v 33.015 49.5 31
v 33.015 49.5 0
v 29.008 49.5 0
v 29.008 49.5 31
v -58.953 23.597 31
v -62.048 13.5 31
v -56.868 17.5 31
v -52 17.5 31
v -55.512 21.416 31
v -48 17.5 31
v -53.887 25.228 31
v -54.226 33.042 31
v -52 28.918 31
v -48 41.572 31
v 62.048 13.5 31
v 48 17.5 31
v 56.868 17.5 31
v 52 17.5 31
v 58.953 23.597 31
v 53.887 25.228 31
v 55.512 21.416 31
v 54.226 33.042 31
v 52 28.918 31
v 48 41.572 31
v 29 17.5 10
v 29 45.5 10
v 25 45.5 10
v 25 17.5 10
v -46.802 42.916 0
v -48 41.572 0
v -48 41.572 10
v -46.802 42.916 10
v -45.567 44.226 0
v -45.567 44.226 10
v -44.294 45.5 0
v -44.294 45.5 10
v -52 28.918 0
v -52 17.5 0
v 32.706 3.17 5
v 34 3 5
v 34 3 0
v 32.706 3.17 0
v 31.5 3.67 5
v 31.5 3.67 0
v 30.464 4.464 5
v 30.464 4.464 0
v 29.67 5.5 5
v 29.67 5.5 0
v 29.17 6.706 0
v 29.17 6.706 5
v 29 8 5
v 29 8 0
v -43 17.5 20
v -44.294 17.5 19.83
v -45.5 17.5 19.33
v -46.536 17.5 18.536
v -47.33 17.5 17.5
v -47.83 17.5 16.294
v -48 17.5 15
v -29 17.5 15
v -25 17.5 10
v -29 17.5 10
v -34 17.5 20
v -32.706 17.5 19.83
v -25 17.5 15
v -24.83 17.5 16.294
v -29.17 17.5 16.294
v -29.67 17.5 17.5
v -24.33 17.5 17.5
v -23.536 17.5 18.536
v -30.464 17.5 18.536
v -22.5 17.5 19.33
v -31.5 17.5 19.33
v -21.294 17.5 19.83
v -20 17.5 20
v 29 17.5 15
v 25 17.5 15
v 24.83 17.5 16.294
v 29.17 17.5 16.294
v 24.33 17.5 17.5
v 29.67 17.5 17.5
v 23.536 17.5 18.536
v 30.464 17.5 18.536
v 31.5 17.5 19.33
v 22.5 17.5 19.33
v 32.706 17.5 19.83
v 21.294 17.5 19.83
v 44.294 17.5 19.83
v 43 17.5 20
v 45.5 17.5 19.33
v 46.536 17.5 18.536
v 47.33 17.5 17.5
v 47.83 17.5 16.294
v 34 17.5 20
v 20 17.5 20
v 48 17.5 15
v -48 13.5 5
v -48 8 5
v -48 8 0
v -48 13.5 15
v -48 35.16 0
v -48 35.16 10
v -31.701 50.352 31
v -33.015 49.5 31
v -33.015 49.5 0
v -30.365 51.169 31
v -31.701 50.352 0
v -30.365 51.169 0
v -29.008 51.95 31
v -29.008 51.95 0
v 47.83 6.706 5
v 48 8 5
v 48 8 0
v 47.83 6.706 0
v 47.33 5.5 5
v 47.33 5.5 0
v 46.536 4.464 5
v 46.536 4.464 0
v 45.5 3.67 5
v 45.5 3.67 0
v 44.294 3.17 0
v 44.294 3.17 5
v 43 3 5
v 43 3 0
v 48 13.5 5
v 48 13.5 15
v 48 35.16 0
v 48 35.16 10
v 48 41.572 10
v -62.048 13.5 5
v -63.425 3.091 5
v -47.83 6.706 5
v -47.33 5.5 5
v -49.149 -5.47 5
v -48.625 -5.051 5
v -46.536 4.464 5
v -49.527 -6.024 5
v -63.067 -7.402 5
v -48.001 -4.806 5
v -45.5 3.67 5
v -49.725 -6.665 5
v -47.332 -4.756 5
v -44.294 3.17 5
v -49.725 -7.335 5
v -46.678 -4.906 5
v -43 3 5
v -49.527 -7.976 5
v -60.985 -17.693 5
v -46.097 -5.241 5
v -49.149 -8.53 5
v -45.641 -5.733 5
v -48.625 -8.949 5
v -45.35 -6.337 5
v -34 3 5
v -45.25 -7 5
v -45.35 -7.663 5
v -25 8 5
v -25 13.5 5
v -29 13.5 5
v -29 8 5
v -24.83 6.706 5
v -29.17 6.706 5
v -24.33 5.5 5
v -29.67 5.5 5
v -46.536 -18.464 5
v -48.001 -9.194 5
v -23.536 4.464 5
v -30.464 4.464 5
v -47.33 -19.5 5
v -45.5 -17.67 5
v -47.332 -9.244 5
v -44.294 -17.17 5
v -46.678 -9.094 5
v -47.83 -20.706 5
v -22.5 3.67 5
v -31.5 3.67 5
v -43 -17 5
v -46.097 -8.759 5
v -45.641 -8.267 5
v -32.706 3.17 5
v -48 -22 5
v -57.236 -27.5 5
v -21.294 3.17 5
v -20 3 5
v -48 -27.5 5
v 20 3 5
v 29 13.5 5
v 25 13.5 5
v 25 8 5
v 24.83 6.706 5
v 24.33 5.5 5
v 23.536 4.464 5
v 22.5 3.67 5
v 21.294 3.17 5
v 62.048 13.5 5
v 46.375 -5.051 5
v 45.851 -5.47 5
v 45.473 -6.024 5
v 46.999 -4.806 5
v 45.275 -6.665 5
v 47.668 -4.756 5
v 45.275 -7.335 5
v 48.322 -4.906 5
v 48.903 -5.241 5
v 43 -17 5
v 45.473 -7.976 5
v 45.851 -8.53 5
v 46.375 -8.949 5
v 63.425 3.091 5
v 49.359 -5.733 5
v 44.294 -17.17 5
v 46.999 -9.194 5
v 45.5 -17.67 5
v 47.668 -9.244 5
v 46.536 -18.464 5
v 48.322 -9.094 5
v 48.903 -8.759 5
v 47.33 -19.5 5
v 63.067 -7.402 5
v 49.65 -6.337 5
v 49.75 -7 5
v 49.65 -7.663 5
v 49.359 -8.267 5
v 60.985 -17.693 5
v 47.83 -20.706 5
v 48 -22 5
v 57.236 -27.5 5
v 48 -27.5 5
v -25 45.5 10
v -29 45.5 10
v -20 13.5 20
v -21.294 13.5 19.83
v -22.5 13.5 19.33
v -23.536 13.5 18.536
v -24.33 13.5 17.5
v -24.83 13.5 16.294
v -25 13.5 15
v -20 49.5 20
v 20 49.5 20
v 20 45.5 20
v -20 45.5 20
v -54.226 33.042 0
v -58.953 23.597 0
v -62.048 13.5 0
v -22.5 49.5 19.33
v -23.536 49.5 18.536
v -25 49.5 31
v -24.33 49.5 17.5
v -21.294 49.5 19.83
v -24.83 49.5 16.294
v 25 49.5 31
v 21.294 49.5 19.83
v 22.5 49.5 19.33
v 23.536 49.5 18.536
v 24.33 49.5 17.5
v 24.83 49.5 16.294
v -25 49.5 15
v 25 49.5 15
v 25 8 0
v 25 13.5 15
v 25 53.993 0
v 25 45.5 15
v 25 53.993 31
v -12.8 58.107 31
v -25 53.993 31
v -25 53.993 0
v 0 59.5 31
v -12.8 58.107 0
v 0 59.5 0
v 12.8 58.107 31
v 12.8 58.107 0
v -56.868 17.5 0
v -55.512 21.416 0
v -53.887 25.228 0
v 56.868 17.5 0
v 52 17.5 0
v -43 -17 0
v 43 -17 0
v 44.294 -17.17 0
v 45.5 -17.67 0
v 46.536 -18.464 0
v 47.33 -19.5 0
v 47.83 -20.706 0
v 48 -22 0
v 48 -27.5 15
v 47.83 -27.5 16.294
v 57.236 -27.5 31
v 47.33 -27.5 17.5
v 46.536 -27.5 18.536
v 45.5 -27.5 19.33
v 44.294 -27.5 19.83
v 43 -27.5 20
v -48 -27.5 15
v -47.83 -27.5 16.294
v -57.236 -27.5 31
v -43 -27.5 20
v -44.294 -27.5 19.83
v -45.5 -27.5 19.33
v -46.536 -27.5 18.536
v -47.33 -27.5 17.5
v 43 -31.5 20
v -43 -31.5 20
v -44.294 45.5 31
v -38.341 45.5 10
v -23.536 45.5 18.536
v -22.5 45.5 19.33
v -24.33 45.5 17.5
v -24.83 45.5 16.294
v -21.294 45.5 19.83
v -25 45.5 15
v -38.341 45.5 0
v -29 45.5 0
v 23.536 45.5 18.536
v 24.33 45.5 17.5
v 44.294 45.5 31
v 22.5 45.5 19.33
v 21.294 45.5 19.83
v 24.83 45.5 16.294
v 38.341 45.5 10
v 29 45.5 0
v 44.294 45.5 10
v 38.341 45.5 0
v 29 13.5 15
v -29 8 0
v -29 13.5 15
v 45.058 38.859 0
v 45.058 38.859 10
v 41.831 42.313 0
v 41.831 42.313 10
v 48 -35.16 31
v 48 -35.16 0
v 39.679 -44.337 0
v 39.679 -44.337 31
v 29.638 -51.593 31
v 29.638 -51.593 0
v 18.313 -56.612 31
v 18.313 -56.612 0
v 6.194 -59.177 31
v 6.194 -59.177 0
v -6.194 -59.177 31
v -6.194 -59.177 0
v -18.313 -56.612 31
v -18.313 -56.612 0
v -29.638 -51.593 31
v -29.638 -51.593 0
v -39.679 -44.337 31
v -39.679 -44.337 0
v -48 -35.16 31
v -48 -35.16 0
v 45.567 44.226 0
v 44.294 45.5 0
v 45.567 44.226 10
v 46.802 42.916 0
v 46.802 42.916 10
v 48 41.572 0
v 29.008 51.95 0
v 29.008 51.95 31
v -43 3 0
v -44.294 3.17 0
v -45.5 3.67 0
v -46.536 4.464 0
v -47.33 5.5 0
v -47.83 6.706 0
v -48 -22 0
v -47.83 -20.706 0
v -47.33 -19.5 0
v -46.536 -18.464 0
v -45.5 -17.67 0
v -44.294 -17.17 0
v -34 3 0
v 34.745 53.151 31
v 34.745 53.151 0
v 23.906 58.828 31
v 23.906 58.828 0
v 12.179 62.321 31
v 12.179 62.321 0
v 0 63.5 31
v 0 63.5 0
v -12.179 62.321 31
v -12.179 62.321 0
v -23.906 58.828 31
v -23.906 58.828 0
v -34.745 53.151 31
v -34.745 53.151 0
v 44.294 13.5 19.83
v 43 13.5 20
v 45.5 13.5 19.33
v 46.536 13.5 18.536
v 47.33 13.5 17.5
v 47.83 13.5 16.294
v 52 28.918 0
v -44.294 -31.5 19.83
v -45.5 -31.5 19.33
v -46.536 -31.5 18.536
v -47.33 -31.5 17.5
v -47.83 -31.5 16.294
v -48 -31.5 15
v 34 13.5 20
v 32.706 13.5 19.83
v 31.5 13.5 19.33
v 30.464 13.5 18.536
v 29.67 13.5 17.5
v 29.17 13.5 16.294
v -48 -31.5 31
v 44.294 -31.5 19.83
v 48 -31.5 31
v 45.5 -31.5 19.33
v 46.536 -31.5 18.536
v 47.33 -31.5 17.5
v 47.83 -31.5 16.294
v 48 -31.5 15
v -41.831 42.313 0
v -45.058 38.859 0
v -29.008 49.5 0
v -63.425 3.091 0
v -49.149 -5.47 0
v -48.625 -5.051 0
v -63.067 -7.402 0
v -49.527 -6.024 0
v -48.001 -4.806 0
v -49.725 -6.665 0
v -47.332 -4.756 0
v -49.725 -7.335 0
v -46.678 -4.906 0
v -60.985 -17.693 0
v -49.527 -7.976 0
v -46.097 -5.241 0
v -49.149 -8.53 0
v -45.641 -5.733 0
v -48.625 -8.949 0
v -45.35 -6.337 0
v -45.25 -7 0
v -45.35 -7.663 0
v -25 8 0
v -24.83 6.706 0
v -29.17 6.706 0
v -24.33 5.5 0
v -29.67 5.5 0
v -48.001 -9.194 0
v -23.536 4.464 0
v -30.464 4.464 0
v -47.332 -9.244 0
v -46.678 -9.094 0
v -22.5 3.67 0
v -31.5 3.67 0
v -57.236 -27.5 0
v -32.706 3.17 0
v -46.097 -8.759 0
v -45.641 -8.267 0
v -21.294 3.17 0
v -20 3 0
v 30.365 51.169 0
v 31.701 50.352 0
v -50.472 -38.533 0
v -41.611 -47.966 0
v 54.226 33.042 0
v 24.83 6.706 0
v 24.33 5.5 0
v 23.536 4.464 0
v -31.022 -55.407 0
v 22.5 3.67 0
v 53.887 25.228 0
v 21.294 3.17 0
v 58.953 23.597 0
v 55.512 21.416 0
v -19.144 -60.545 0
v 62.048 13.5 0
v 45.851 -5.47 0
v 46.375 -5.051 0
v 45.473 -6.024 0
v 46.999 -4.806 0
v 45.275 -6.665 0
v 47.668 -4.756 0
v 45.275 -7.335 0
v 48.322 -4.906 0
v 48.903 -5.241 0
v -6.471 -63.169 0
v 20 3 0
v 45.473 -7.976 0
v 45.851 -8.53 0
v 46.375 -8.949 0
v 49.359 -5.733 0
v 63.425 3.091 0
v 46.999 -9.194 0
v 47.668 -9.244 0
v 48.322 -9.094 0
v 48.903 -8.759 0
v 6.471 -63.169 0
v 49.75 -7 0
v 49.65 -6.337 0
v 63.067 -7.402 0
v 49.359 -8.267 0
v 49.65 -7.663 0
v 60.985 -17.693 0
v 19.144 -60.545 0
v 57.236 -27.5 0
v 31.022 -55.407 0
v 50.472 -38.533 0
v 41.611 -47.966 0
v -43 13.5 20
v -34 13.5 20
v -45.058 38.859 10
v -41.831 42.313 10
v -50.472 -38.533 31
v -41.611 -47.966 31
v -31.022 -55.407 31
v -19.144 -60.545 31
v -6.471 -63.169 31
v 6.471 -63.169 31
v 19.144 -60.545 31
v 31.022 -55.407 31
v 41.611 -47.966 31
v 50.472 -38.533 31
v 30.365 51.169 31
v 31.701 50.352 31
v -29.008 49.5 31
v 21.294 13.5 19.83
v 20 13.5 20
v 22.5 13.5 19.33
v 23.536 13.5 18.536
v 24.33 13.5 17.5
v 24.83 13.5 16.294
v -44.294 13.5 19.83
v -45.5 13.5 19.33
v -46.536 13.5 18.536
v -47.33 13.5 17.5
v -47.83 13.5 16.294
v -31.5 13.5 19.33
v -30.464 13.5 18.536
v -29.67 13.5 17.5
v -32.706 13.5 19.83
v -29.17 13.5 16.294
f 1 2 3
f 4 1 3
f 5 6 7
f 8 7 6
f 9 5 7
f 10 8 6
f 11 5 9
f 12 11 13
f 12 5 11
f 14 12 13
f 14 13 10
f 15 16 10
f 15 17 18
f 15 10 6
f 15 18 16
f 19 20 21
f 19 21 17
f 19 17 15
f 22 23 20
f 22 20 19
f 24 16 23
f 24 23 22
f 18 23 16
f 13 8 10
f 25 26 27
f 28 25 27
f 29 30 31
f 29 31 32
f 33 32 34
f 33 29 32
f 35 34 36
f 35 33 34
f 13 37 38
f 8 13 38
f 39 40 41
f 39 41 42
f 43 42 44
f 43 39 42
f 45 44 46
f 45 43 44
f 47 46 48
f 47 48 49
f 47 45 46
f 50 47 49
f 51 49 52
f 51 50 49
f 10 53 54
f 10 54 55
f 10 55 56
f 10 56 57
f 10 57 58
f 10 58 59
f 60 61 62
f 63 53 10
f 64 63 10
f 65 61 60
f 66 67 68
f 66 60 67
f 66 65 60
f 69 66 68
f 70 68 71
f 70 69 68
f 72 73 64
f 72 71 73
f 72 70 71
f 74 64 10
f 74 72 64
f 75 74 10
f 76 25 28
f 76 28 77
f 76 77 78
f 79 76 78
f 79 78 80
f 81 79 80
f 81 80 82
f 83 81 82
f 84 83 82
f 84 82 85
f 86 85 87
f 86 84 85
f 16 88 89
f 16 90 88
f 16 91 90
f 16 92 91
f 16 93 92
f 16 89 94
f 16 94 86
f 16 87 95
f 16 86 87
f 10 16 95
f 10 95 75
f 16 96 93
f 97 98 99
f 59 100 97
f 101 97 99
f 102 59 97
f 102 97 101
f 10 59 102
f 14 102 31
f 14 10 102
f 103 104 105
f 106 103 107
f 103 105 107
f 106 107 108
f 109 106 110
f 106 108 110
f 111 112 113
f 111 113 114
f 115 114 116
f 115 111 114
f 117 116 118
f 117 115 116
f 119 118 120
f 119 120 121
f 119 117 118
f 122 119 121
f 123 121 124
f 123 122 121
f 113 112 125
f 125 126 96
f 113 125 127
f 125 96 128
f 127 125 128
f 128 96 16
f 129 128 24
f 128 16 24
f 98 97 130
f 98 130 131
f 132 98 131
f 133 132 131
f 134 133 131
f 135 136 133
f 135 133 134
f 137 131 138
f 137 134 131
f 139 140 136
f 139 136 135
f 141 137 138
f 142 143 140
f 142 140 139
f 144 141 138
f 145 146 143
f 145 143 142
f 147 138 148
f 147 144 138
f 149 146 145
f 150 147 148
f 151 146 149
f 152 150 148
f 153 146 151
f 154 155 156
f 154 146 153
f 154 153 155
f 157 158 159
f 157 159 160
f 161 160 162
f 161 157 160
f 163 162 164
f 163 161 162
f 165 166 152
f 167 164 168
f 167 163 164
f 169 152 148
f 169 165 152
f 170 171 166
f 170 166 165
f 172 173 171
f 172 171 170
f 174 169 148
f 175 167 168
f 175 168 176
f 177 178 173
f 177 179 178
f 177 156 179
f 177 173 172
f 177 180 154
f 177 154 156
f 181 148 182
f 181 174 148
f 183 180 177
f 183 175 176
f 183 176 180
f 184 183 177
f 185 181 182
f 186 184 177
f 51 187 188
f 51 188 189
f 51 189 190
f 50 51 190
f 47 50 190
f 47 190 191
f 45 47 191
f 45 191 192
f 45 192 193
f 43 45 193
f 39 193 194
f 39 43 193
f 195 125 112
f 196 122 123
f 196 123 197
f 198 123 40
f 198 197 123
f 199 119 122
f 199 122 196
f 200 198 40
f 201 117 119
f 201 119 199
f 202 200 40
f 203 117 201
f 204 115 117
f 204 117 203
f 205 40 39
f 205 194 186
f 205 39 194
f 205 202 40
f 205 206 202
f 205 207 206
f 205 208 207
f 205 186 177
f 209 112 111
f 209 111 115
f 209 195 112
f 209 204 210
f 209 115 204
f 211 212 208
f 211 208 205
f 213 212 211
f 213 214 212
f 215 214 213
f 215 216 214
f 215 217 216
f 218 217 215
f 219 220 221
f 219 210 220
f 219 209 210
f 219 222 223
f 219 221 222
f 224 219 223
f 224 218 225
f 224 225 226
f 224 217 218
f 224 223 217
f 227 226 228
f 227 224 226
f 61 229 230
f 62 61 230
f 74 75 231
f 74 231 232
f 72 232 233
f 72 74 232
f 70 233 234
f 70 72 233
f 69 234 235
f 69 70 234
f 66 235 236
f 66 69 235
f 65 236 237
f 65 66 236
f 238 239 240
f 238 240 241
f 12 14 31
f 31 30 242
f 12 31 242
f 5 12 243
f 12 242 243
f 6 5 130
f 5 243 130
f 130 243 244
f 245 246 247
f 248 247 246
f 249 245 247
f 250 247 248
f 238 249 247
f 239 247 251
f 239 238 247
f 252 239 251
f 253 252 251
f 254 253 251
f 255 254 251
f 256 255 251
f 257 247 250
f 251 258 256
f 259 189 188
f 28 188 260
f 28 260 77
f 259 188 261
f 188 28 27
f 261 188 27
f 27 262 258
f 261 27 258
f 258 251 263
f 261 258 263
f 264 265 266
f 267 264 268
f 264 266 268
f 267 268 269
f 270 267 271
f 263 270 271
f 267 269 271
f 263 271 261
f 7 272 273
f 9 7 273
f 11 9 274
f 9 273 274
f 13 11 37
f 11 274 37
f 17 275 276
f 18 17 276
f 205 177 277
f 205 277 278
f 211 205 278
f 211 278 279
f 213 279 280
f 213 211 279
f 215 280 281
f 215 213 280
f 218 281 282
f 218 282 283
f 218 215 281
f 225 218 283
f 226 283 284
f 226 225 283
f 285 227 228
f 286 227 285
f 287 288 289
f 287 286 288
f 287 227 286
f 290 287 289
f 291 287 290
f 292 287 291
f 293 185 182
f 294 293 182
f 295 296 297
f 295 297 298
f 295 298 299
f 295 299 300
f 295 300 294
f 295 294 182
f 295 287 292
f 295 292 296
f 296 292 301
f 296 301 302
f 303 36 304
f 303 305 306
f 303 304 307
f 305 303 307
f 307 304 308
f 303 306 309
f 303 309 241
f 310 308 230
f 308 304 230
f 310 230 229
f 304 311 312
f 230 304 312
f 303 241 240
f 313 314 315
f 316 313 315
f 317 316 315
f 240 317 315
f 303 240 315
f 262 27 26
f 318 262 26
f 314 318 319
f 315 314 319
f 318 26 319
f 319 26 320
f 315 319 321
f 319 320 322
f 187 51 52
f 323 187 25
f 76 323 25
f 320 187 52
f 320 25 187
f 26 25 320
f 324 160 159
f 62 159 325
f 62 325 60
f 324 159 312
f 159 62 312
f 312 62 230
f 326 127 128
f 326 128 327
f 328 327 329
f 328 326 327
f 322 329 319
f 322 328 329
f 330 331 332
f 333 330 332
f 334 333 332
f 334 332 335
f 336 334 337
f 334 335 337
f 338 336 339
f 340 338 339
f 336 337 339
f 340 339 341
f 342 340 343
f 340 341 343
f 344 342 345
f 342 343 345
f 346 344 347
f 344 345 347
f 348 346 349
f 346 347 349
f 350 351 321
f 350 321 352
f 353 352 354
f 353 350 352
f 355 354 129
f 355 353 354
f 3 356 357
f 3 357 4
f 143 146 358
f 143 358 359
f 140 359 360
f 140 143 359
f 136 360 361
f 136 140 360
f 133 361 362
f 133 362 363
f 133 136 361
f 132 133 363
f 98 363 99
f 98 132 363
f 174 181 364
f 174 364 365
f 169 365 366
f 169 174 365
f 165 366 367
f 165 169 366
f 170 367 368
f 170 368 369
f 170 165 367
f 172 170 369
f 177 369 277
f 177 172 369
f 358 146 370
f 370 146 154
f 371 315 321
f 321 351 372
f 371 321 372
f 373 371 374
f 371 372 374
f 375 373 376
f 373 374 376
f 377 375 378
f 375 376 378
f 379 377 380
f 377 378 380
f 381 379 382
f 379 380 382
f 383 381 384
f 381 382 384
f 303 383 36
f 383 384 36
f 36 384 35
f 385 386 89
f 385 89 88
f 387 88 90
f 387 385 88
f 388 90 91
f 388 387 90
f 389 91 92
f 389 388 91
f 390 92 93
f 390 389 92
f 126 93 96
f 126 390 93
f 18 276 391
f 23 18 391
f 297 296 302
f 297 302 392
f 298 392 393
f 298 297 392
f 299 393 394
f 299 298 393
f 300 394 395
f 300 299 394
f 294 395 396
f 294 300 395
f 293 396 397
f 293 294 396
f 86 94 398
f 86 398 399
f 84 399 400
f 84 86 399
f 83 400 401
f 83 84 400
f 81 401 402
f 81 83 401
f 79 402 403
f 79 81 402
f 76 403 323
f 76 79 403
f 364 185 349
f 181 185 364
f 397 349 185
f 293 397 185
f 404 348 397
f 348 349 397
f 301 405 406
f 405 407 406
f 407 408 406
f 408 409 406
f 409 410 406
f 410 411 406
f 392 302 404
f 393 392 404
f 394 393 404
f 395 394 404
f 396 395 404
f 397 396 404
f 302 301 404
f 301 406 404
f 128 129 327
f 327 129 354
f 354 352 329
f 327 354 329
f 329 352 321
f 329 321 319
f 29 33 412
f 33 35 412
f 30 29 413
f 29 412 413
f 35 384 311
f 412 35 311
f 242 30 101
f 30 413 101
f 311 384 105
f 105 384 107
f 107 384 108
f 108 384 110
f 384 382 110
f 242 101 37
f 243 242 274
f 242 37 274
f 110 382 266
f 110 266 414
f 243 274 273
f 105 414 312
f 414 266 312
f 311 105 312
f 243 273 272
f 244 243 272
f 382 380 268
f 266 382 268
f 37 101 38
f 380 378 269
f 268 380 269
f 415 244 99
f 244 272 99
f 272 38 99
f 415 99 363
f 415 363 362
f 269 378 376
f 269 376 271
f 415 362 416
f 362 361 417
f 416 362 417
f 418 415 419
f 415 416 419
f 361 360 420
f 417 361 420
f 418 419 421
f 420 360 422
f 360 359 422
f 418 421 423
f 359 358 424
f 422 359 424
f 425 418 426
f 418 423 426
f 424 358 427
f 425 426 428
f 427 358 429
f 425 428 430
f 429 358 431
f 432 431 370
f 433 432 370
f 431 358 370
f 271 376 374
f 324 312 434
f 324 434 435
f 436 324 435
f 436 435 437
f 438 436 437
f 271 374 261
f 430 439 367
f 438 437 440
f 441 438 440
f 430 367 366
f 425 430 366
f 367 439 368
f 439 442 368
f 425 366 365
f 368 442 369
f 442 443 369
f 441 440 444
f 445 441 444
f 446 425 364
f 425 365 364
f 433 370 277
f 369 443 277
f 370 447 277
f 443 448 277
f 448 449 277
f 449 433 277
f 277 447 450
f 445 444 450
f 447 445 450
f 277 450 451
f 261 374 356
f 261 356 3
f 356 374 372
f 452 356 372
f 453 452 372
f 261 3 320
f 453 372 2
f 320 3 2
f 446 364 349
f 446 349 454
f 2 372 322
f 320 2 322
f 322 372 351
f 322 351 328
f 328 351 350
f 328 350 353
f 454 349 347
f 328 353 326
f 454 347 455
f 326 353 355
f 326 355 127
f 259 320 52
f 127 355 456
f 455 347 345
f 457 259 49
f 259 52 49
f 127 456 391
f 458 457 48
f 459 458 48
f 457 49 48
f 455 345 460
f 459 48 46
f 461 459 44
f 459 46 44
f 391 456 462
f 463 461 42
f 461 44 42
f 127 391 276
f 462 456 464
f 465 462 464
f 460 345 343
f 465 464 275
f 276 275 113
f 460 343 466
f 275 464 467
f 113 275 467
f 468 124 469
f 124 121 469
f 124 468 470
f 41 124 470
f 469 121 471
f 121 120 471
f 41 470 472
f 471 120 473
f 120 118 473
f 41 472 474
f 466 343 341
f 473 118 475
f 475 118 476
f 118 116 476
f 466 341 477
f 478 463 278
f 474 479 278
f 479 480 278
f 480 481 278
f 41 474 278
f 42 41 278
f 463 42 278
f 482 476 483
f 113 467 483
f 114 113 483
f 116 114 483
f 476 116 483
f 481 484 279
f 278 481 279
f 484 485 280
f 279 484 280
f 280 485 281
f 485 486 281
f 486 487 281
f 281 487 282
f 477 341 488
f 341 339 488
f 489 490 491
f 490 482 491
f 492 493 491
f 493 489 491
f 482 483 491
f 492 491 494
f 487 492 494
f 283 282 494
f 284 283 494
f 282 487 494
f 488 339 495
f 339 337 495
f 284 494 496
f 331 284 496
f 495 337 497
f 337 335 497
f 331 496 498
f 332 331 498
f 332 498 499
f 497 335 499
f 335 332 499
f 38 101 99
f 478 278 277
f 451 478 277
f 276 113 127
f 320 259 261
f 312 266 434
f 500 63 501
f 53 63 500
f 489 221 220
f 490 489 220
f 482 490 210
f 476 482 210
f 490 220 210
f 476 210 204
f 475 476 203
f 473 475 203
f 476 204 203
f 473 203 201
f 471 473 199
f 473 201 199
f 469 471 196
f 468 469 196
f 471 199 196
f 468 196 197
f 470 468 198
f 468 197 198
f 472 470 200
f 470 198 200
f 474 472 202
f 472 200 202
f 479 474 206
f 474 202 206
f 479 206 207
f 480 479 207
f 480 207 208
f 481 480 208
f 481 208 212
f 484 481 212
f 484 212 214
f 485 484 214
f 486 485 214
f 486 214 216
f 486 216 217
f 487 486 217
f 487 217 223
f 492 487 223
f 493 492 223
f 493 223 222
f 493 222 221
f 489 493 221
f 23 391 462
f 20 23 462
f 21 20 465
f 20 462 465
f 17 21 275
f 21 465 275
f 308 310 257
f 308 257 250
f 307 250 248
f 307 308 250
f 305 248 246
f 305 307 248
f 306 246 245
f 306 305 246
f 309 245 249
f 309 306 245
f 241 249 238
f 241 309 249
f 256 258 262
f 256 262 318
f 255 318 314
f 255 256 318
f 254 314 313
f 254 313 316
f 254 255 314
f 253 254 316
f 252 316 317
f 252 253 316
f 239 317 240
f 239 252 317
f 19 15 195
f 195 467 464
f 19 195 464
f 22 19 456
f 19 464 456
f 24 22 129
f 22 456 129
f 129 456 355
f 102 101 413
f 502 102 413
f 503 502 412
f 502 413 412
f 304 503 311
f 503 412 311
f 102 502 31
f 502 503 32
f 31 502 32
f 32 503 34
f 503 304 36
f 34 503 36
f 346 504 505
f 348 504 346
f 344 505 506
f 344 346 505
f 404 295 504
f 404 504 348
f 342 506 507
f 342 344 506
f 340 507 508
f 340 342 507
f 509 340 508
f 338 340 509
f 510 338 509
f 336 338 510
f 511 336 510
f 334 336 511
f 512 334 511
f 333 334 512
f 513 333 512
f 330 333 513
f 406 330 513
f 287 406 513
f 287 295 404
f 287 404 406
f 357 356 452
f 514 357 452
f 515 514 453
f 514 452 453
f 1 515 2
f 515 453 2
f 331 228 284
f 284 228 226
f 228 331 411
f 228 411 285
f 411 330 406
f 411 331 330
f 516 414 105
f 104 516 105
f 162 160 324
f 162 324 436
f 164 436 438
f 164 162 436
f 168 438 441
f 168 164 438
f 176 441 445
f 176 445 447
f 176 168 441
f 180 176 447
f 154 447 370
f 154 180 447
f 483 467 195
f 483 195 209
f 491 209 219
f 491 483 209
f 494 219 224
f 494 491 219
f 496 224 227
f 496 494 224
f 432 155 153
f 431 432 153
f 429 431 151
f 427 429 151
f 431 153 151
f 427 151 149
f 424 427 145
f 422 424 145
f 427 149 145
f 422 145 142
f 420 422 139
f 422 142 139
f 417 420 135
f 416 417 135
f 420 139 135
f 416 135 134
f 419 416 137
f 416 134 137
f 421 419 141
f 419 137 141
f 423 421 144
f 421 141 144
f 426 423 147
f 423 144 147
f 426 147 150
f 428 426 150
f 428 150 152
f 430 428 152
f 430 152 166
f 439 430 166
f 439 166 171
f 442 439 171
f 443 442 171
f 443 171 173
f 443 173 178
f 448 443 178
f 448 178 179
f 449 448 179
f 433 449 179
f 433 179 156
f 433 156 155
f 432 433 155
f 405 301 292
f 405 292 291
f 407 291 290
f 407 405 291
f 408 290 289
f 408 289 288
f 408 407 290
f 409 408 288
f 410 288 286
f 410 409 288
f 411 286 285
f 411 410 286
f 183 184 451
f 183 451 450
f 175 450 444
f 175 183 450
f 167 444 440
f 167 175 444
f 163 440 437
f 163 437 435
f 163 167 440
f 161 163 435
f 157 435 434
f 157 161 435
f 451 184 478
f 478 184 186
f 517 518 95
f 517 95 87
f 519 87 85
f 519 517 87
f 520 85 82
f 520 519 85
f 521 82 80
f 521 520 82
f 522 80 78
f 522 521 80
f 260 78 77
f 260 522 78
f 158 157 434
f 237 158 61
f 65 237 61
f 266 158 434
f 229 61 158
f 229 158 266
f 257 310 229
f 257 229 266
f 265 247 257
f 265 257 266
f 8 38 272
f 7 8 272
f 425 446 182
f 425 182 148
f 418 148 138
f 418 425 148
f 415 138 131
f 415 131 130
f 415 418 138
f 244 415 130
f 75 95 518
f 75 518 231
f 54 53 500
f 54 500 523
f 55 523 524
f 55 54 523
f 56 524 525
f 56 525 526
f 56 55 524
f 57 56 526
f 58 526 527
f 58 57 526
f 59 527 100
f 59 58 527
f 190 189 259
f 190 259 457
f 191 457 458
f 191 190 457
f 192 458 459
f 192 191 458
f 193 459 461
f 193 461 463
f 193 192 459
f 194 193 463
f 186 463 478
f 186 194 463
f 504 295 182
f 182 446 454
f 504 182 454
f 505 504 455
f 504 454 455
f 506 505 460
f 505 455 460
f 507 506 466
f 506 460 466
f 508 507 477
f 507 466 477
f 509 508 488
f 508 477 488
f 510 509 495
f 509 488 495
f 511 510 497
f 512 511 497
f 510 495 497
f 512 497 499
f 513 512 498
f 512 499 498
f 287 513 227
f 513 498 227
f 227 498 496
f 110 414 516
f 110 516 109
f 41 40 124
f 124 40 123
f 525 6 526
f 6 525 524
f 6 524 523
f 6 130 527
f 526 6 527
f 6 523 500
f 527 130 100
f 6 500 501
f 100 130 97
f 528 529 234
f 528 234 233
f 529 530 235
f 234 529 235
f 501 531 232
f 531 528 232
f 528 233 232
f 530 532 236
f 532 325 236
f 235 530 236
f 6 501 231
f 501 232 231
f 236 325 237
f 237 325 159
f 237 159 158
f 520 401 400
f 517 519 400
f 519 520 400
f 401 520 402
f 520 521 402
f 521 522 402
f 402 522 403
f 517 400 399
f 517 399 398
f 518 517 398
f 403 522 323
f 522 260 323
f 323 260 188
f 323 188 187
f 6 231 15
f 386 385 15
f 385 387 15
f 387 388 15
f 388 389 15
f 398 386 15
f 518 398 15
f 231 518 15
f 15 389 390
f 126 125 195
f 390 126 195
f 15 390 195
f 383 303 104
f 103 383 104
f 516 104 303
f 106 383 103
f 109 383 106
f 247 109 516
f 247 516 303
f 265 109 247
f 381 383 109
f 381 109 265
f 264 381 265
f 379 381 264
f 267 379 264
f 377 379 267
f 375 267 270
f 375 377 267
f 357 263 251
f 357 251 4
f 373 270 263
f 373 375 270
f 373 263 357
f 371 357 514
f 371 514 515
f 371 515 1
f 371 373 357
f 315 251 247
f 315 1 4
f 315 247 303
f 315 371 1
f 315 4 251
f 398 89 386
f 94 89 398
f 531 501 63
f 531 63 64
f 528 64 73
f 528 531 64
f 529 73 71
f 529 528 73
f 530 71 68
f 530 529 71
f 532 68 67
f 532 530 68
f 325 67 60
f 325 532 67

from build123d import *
from build123d.topology import SkipClean

# Parameters (mm, degrees)
BOSS_EXTRUDE1_DEPTH = 31
BOSS_EXTRUDE3_DEPTH = 10
BOSS_EXTRUDE4_DEPTH = 5
SKETCH6_W           = 19
SKETCH6_H           = 10.5
SKETCH6_R           = 2.25
SKETCH6_W_2         = 50
SKETCH6_W_3         = 96
CUT_EXTRUDE1_DEPTH  = 94.490641243
CUT_EXTRUDE2_DEPTH  = 10
SKETCH9_W           = 96
SKETCH9_H           = 4
SKETCH9_W_2         = 19
SKETCH9_W_3         = 50
CUT_EXTRUDE4_DEPTH  = 20
BOSS_EXTRUDE5_DEPTH = 31
FILLET3_R           = 5


with BuildPart() as part:
    # Sketch1 → Boss-Extrude1 (new body)
    with BuildSketch(Plane.XY):
        with BuildLine():
            ThreePointArc((-50.477717856, -31.5), (-51.659400485, -29.522133079), (-52.763623833, -27.5))
            Line((-52.763623833, -27.5), (-57.236352085, -27.5))
            ThreePointArc((-57.236352085, -27.5), (0, -63.5), (57.236352085, -27.5))
            Line((57.236352085, -27.5), (52.763623833, -27.5))
            ThreePointArc((52.763623833, -27.5), (51.659400485, -29.522133079), (50.477717856, -31.5))
            ThreePointArc((50.477717856, -31.5), (49.272860314, -33.353189299), (48, -35.160346983))
            ThreePointArc((48, -35.160346983), (0, -59.5), (-48, -35.160346983))
            ThreePointArc((-48, -35.160346983), (-49.272860314, -33.353189299), (-50.477717856, -31.5))
        make_face()
        with BuildLine():
            Line((52.763623833, -27.5), (-52.763623833, -27.5))
            ThreePointArc((-52.763623833, -27.5), (-51.659400485, -29.522133079), (-50.477717856, -31.5))
            Line((-50.477717856, -31.5), (-48, -31.5))
            Line((-48, -31.5), (48, -31.5))
            Line((48, -31.5), (50.477717856, -31.5))
            ThreePointArc((50.477717856, -31.5), (51.659400485, -29.522133079), (52.763623833, -27.5))
        make_face()
        with BuildLine():
            ThreePointArc((-56.868268832, 17.5), (-57.443088433, 15.50940332), (-57.948252778, 13.5))
            Line((-57.948252778, 13.5), (57.948252778, 13.5))
            ThreePointArc((57.948252778, 13.5), (57.443088433, 15.50940332), (56.868268832, 17.5))
            Line((56.868268832, 17.5), (52, 17.5))
            Line((52, 17.5), (48, 17.5))
            Line((48, 17.5), (-48, 17.5))
            Line((-48, 17.5), (-52, 17.5))
            Line((-52, 17.5), (-56.868268832, 17.5))
        make_face()
        with BuildLine():
            Line((-52, 28.917987482), (-52, 17.5))
            Line((-52, 17.5), (-48, 17.5))
            Line((-48, 17.5), (-48, 35.160346983))
            ThreePointArc((-48, 35.160346983), (-50.097322913, 32.101530134), (-52, 28.917987482))
        make_face()
        with BuildLine():
            Line((-62.04836823, 13.5), (-57.948252778, 13.5))
            ThreePointArc((-57.948252778, 13.5), (-57.443088433, 15.50940332), (-56.868268832, 17.5))
            ThreePointArc((-56.868268832, 17.5), (-54.732692234, 23.336289354), (-52, 28.917987482))
            ThreePointArc((-52, 28.917987482), (-50.097322913, 32.101530134), (-48, 35.160346983))
            Line((-48, 35.160346983), (-48, 41.572226306))
            ThreePointArc((-48, 41.572226306), (-56.78620704, 28.417893835), (-62.04836823, 13.5))
        make_face()
        with BuildLine():
            ThreePointArc((56.868268832, 17.5), (57.443088433, 15.50940332), (57.948252778, 13.5))
            Line((57.948252778, 13.5), (62.04836823, 13.5))
            ThreePointArc((62.04836823, 13.5), (56.78620704, 28.417893835), (48, 41.572226306))
            Line((48, 41.572226306), (48, 35.160346983))
            ThreePointArc((48, 35.160346983), (50.097322913, 32.101530134), (52, 28.917987482))
            ThreePointArc((52, 28.917987482), (54.732692234, 23.336289354), (56.868268832, 17.5))
        make_face()
        with BuildLine():
            Line((48, 17.5), (52, 17.5))
            Line((52, 17.5), (52, 28.917987482))
            ThreePointArc((52, 28.917987482), (50.097322913, 32.101530134), (48, 35.160346983))
            Line((48, 35.160346983), (48, 17.5))
        make_face()
        with BuildLine():
            ThreePointArc((44.294469181, 45.5), (0, 63.5), (-44.294469181, 45.5))
            Line((-44.294469181, 45.5), (-38.340579025, 45.5))
            ThreePointArc((-38.340579025, 45.5), (-35.733876731, 47.574573606), (-33.015148038, 49.5))
            ThreePointArc((-33.015148038, 49.5), (0, 59.5), (33.015148038, 49.5))
            ThreePointArc((33.015148038, 49.5), (35.733876731, 47.574573606), (38.340579025, 45.5))
            Line((38.340579025, 45.5), (44.294469181, 45.5))
        make_face()
        with BuildLine():
            ThreePointArc((-33.015148038, 49.5), (-35.733876731, 47.574573606), (-38.340579025, 45.5))
            Line((-38.340579025, 45.5), (38.340579025, 45.5))
            ThreePointArc((38.340579025, 45.5), (35.733876731, 47.574573606), (33.015148038, 49.5))
            Line((33.015148038, 49.5), (-33.015148038, 49.5))
        make_face()
        with BuildLine():
            ThreePointArc((48, -35.160346983), (49.272860314, -33.353189299), (50.477717856, -31.5))
            Line((50.477717856, -31.5), (48, -31.5))
            Line((48, -31.5), (48, -35.160346983))
        make_face()
        with BuildLine():
            Line((-48, -31.5), (-50.477717856, -31.5))
            ThreePointArc((-50.477717856, -31.5), (-49.272860314, -33.353189299), (-48, -35.160346983))
            Line((-48, -35.160346983), (-48, -31.5))
        make_face()
    extrude(amount=BOSS_EXTRUDE1_DEPTH)

    # Sketch2 → Boss-Extrude3 (add)
    with SkipClean():  # the faces are left unmerged after this step: merging them gives an invalid solid
        with BuildSketch(Plane(origin=(0, 0, 0), x_dir=(-1, 0, 0), z_dir=(0, 0, -1))):
            with BuildLine():
                ThreePointArc((48, 41.572226306), (46.189004231, 43.575519367), (44.294469181, 45.5))
                Line((44.294469181, 45.5), (25, 45.5))
                Line((25, 45.5), (25, 17.5))
                Line((25, 17.5), (48, 17.5))
                Line((48, 17.5), (48, 41.572226306))
            make_face()
            with BuildLine():
                Line((-25, 45.5), (-44.294469181, 45.5))
                ThreePointArc((-44.294469181, 45.5), (-46.189004231, 43.575519367), (-48, 41.572226306))
                Line((-48, 41.572226306), (-48, 17.5))
                Line((-48, 17.5), (-25, 17.5))
                Line((-25, 17.5), (-25, 45.5))
            make_face()
        extrude(amount=-BOSS_EXTRUDE3_DEPTH)

    # Sketch4 → Boss-Extrude4 (add)
    with SkipClean():  # the faces are left unmerged after this step: merging them gives an invalid solid
        with BuildSketch(Plane(origin=(0, 0, 0), x_dir=(-1, 0, 0), z_dir=(0, 0, -1))):
            with BuildLine():
                Line((-57.236352085, -27.5), (57.236352085, -27.5))
                ThreePointArc((57.236352085, -27.5), (63.067116036, -7.401950746), (62.04836823, 13.5))
                Line((62.04836823, 13.5), (-62.04836823, 13.5))
                ThreePointArc((-62.04836823, 13.5), (-63.067116036, -7.401950746), (-57.236352085, -27.5))
            make_face()
        extrude(amount=-BOSS_EXTRUDE4_DEPTH)

    # Sketch6 → Cut-Extrude1 (cut, through all)
    with SkipClean():  # the faces are left unmerged after this step: merging them gives an invalid solid
        with BuildSketch(Plane.XY.offset(5)):
            with Locations((-38.5, 8.25)):
                Rectangle(SKETCH6_W, SKETCH6_H)
            with Locations((-47.5, -7)):
                Circle(SKETCH6_R)
            with Locations((0, 8.25)):
                Rectangle(SKETCH6_W_2, SKETCH6_H)
            with Locations((0, -22.25)):
                Rectangle(SKETCH6_W_3, SKETCH6_H)
            with Locations((38.5, 8.25)):
                Rectangle(SKETCH6_W, SKETCH6_H)
            with Locations((47.5, -7)):
                Circle(SKETCH6_R)
        extrude(amount=-CUT_EXTRUDE1_DEPTH, mode=Mode.SUBTRACT)

    # Sketch7 → Cut-Extrude2 (cut)
    with SkipClean():  # the faces are left unmerged after this step: merging them gives an invalid solid
        with BuildSketch(Plane(origin=(0, 0, 0), x_dir=(-1, 0, 0), z_dir=(0, 0, -1))):
            with BuildLine():
                Line((-29, 17.5), (-48, 17.5))
                Line((-48, 17.5), (-48, 35.160346983))
                ThreePointArc((-48, 35.160346983), (-43.478741964, 40.618333265), (-38.340579025, 45.5))
                Line((-38.340579025, 45.5), (-29, 45.5))
                Line((-29, 45.5), (-29, 17.5))
            make_face()
            with BuildLine():
                Line((29, 17.5), (48, 17.5))
                Line((48, 17.5), (48, 35.160346983))
                ThreePointArc((48, 35.160346983), (43.478741964, 40.618333265), (38.340579025, 45.5))
                Line((38.340579025, 45.5), (29, 45.5))
                Line((29, 45.5), (29, 17.5))
            make_face()
        extrude(amount=-CUT_EXTRUDE2_DEPTH, mode=Mode.SUBTRACT)

    # Sketch9 → Cut-Extrude4 (cut)
    with SkipClean():  # the faces are left unmerged after this step: merging them gives an invalid solid
        with BuildSketch(Plane(origin=(0, 0, 0), x_dir=(-1, 0, 0), z_dir=(0, 0, -1))):
            with Locations((0, -29.5)):
                Rectangle(SKETCH9_W, SKETCH9_H)
            with Locations((-38.5, 15.5)):
                Rectangle(SKETCH9_W_2, SKETCH9_H)
            with Locations((0, 15.5)):
                Rectangle(SKETCH9_W_3, SKETCH9_H)
            with Locations((38.5, 15.5)):
                Rectangle(SKETCH9_W_2, SKETCH9_H)
            with Locations((0, 47.5)):
                Rectangle(SKETCH9_W_3, SKETCH9_H)
        extrude(amount=-CUT_EXTRUDE4_DEPTH, mode=Mode.SUBTRACT)

    # Sketch10 → Boss-Extrude5 (add)
    with SkipClean():  # the faces are left unmerged after this step: merging them gives an invalid solid
        with BuildSketch(Plane(origin=(0, 0, 0), x_dir=(-1, 0, 0), z_dir=(0, 0, -1))):
            with BuildLine():
                Line((-29.007574019, 51.950078436), (-29.007574019, 49.5))
                Line((-29.007574019, 49.5), (-25, 49.5))
                Line((-25, 49.5), (-25, 53.993055109))
                ThreePointArc((-25, 53.993055109), (-27.023100327, 53.009452447), (-29.007574019, 51.950078436))
            make_face()
            with BuildLine():
                ThreePointArc((29.007574019, 51.950078436), (27.023100327, 53.009452447), (25, 53.993055109))
                Line((25, 53.993055109), (25, 49.5))
                Line((25, 49.5), (29.007574019, 49.5))
                Line((29.007574019, 49.5), (29.007574019, 51.950078436))
            make_face()
        extrude(amount=-BOSS_EXTRUDE5_DEPTH)

    # Fillet3
    # the kernel refuses this fillet: 5 mm, written as the material it adds along each edge
    with BuildSketch(Plane(origin=(48, -17, 5), x_dir=(-1, 0, 0), z_dir=(0, 0, -1)), Plane(origin=(-48, -17, 5), x_dir=(0, -1, 0), z_dir=(0, 0, -1)), Plane(origin=(-29, 3, 5), x_dir=(0, 1, 0), z_dir=(0, 0, -1)), Plane(origin=(25, 3, 5), x_dir=(0, 1, 0), z_dir=(0, 0, -1)), Plane(origin=(48, 3, 5), x_dir=(0, 1, 0), z_dir=(0, 0, -1))) as fillet3_piece_1:
        with BuildLine():
            CenterArc((FILLET3_R, -FILLET3_R), FILLET3_R, 90, 90)
            Line((0, -FILLET3_R), (0, 0))
            Line((0, 0), (FILLET3_R, 0))
        make_face()
    extrude(amount=5)
    with BuildSketch(Plane(origin=(-48, 3, 5), x_dir=(0, 1, 0), z_dir=(0, 0, -1)), Plane(origin=(-25, 3, 5), x_dir=(0, 1, 0), z_dir=(0, 0, -1)), Plane(origin=(29, 3, 5), x_dir=(0, 1, 0), z_dir=(0, 0, -1))) as fillet3_piece_2:
        with BuildLine():
            CenterArc((FILLET3_R, FILLET3_R), FILLET3_R, 180, 90)
            Line((0, FILLET3_R), (0, 0))
            Line((0, 0), (FILLET3_R, 0))
        make_face()
    extrude(amount=5)
    with BuildSketch(Plane(origin=(48, -31.5, 20), x_dir=(0, 0, -1), z_dir=(0, 1, 0)), Plane(origin=(25, 49.5, 20), x_dir=(-1, 0, 0), z_dir=(0, -1, 0)), Plane(origin=(-29, 13.5, 20), x_dir=(0, 0, -1), z_dir=(0, 1, 0)), Plane(origin=(-48, 17.5, 20), x_dir=(0, 0, -1), z_dir=(0, -1, 0)), Plane(origin=(25, 13.5, 20), x_dir=(0, 0, -1), z_dir=(0, 1, 0))) as fillet3_piece_3:
        with BuildLine():
            CenterArc((FILLET3_R, FILLET3_R), FILLET3_R, 180, 90)
            Line((0, FILLET3_R), (0, 0))
            Line((0, 0), (FILLET3_R, 0))
        make_face()
    extrude(amount=4)
    with BuildSketch(Plane(origin=(-48, -27.5, 20), x_dir=(1, 0, 0), z_dir=(0, -1, 0)), Plane(origin=(-25, 45.5, 20), x_dir=(0, 0, -1), z_dir=(0, 1, 0)), Plane(origin=(-25, 17.5, 20), x_dir=(1, 0, 0), z_dir=(0, -1, 0)), Plane(origin=(48, 13.5, 20), x_dir=(-1, 0, 0), z_dir=(0, 1, 0)), Plane(origin=(29, 17.5, 20), x_dir=(1, 0, 0), z_dir=(0, -1, 0))) as fillet3_piece_4:
        with BuildLine():
            CenterArc((FILLET3_R, -FILLET3_R), FILLET3_R, 90, 90)
            Line((0, -FILLET3_R), (0, 0))
            Line((0, 0), (FILLET3_R, 0))
        make_face()
    extrude(amount=4)


solid = part.part
